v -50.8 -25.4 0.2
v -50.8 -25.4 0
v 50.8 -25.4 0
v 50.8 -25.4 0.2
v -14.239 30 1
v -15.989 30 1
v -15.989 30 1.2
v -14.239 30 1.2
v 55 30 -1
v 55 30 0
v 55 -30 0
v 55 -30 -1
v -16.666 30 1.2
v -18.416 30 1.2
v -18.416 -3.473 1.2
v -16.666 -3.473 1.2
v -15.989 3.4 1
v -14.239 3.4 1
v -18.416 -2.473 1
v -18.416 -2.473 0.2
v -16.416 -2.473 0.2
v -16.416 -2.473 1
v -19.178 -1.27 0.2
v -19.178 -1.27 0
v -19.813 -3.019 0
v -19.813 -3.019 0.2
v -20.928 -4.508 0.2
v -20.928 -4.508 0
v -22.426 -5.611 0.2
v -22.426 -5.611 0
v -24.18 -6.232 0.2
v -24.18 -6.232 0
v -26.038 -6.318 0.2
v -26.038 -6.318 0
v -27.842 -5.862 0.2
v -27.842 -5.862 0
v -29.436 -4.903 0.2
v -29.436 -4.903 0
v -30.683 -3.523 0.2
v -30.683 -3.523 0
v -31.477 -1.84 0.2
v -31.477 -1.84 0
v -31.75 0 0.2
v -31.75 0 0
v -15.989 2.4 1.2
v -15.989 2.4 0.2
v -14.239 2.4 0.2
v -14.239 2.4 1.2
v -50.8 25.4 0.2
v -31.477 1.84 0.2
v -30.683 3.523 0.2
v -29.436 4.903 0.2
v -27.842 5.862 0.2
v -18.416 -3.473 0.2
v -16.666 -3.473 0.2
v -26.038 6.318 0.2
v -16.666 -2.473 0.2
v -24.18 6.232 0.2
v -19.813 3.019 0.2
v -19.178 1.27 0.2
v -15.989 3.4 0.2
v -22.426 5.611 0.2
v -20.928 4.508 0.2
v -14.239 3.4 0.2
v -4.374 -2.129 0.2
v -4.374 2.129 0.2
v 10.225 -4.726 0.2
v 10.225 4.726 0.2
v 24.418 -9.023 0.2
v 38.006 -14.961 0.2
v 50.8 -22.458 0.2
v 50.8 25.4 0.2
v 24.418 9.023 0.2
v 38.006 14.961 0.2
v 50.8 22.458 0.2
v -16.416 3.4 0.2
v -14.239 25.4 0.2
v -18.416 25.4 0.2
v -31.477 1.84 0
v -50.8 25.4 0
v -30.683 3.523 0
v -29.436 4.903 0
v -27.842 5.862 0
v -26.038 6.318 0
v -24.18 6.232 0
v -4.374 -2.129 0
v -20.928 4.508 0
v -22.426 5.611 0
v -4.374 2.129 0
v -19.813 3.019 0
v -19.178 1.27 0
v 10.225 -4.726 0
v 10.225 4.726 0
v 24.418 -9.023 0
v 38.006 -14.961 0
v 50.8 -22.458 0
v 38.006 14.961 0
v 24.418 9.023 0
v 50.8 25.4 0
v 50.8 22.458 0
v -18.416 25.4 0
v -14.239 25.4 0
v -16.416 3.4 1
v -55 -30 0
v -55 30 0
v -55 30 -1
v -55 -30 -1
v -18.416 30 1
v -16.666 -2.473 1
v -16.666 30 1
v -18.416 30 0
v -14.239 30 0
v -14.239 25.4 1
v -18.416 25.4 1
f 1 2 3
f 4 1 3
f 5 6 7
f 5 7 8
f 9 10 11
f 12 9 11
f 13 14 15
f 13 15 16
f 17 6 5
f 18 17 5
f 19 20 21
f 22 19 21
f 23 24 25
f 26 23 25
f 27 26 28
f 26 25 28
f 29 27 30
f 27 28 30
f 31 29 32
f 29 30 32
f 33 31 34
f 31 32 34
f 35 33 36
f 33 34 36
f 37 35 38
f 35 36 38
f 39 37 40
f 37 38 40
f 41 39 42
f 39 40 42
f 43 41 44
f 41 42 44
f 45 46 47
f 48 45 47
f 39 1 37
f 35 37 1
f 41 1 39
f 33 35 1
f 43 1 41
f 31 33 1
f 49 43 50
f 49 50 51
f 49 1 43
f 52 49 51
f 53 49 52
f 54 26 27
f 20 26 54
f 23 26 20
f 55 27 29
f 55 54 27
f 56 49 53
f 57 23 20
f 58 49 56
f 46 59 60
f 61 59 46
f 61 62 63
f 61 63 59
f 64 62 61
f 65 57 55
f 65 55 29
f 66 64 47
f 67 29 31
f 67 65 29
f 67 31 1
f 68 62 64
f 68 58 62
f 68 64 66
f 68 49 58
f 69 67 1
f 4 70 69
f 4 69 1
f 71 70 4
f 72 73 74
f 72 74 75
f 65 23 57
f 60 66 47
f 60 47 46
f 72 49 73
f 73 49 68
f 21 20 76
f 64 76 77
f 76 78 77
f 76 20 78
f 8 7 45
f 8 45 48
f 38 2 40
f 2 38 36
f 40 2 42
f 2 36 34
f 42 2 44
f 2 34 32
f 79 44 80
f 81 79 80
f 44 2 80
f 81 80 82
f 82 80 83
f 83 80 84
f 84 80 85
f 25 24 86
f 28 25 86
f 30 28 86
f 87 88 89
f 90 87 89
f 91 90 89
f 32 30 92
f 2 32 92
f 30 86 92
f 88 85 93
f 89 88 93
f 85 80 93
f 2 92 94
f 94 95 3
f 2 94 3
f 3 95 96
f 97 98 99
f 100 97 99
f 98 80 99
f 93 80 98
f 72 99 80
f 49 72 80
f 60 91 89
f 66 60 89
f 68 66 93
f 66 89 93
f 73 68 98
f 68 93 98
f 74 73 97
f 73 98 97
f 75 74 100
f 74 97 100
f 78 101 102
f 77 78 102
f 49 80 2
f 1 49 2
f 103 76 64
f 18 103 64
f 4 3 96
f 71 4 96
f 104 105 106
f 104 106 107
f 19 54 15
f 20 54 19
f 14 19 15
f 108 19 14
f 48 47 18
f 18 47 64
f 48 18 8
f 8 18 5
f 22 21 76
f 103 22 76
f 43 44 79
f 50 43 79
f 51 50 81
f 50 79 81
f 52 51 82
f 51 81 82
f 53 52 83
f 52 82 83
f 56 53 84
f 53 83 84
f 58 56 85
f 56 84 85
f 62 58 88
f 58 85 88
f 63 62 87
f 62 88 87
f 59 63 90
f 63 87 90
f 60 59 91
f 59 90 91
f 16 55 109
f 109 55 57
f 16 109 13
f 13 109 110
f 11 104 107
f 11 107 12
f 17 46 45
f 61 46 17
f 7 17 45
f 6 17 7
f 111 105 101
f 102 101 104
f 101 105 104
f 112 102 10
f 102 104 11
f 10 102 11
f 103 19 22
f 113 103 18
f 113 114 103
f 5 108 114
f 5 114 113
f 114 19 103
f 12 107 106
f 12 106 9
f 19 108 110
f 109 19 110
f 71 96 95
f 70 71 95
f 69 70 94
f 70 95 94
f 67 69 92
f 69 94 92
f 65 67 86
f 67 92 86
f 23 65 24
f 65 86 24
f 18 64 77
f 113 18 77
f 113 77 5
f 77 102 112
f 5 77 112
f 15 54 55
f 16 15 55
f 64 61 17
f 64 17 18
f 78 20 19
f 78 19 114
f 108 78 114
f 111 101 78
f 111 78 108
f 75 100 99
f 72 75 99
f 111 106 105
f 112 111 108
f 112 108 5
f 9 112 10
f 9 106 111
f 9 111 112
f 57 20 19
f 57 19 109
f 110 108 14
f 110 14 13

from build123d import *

# Parameters (mm, degrees)
F1_DEPTH  = 0.2
F2_W      = 110
F2_H      = 60
F3_DEPTH  = 1
F5_DEPTH  = 0.8
F6_W      = 4.1765728965
F6_H      = 4.6
F7_DEPTH  = 1
F8_W      = 1.75
F8_H      = 32.4733061887
F9_DEPTH  = 0.2
F8_H_2    = 26.6
F10_W     = 1.75
F10_H     = 1
F11_DEPTH = 1


with BuildPart() as f1:
    # F0 (on Top) → F1 (new body)
    with BuildSketch(Plane.XY):
        with BuildLine():
            Line((-50.8, 25.4), (-50.8, 0))
            Line((-50.8, 0), (-31.75, 0))
            ThreePointArc((-31.75, 0), (-26.0382651501, 6.3178412134), (-19.1783094179, 1.2700654709))
            ThreePointArc((-19.1783094179, 1.2700654709), (17.3850333876, 6.6649625336), (50.8, 22.4580926135))
            Line((50.8, 22.4580926135), (50.8, 25.4))
            Line((50.8, 25.4), (-50.8, 25.4))
        make_face()
        with BuildLine():
            Line((-50.8, -25.4), (50.8, -25.4))
            Line((50.8, -25.4), (50.8, -22.4580926135))
            ThreePointArc((50.8, -22.4580926135), (17.3850333876, -6.6649625336), (-19.1783094179, -1.2700654709))
            ThreePointArc((-19.1783094179, -1.2700654709), (-26.0382651501, -6.3178412134), (-31.75, 0))
            Line((-31.75, 0), (-50.8, 0))
            Line((-50.8, 0), (-50.8, -25.4))
        make_face()
    extrude(amount=F1_DEPTH)



with BuildPart() as f3:
    # F2 (on face) → F3 (new body)
    with BuildSketch(Plane(origin=(0, 0, 0), x_dir=(1, 0, 0), z_dir=(0, 0, -1))):
        Rectangle(F2_W, F2_H)
        with BuildLine():
            Line((-50.8, -25.4), (-50.8, 25.4))
            Line((-50.8, 25.4), (50.8, 25.4))
            Line((50.8, 25.4), (50.8, 22.4580926135))
            ThreePointArc((50.8, 22.4580926135), (17.3850333876, 6.6649625336), (-19.1783094179, 1.2700654709))
            ThreePointArc((-19.1783094179, 1.2700654709), (-31.75, 0), (-19.1783094179, -1.2700654709))
            ThreePointArc((-19.1783094179, -1.2700654709), (17.3850333876, -6.6649625336), (50.8, -22.4580926135))
            Line((50.8, -22.4580926135), (50.8, -25.4))
            Line((50.8, -25.4), (-50.8, -25.4))
        make_face(mode=Mode.SUBTRACT)
        with BuildLine():
            Line((50.8, 25.4), (-50.8, 25.4))
            Line((-50.8, 25.4), (-50.8, -25.4))
            Line((-50.8, -25.4), (50.8, -25.4))
            Line((50.8, -25.4), (50.8, -22.4580926135))
            ThreePointArc((50.8, -22.4580926135), (17.3850333876, -6.6649625336), (-19.1783094179, -1.2700654709))
            ThreePointArc((-19.1783094179, -1.2700654709), (-31.75, 0), (-19.1783094179, 1.2700654709))
            ThreePointArc((-19.1783094179, 1.2700654709), (17.3850333876, 6.6649625336), (50.8, 22.4580926135))
            Line((50.8, 22.4580926135), (50.8, 25.4))
        make_face()
    extrude(amount=F3_DEPTH)



with BuildPart() as f5:
    # F4 (on face) → F5 (new body)
    with BuildSketch(Plane.XY.offset(0.2)):
        with BuildLine():
            ThreePointArc((-16.4155218303, -1.2976037429), (-17.4154701214, -1.2806251524), (-18.4155218303, -1.2716009111))
            Line((-18.4155218303, -1.2716009111), (-18.4155218303, -2.4733061887))
            Line((-18.4155218303, -2.4733061887), (-16.4155218303, -2.4733061887))
            Line((-16.4155218303, -2.4733061887), (-16.4155218303, -1.2976037429))
        make_face()
        with BuildLine():
            ThreePointArc((-16.4155218303, 1.2976037429), (-17.4154701214, 1.2806251524), (-18.4155218303, 1.2716009111))
            Line((-18.4155218303, 1.2716009111), (-18.4155218303, -1.2716009111))
            ThreePointArc((-18.4155218303, -1.2716009111), (-17.4154701214, -1.2806251524), (-16.4155218303, -1.2976037429))
            Line((-16.4155218303, -1.2976037429), (-16.4155218303, 1.2976037429))
        make_face()
        with BuildLine():
            Line((-16.4155218303, 3.4), (-18.4155218303, 3.4))
            Line((-18.4155218303, 3.4), (-18.4155218303, 1.2716009111))
            ThreePointArc((-18.4155218303, 1.2716009111), (-17.4154701214, 1.2806251524), (-16.4155218303, 1.2976037429))
            Line((-16.4155218303, 1.2976037429), (-16.4155218303, 3.4))
        make_face()
        Polygon((-18.4155218303, 25.4), (-18.4155218303, 3.4), (-16.4155218303, 3.4), (-14.2389489338, 3.4), (-14.2389489338, 25.4), align=None)
    extrude(amount=F5_DEPTH)


with BuildPart() as f3_1:
    add(f3.part)

    add(f5.part)  # F7 merges F5
    # F6 (on face) → F7 (join)
    with BuildSketch(Plane.XY):
        with Locations((-16.3272353821, 27.7)):
            Rectangle(F6_W, F6_H)
    extrude(amount=F7_DEPTH)


with BuildPart() as f9:
    # F8 (on face) → F9 (new body)
    with BuildSketch(Plane.XY.offset(1)):
        with Locations((-17.5405218303, 13.7633469056)):
            Rectangle(F8_W, F8_H)
    extrude(amount=F9_DEPTH)


with BuildPart() as f9b:
    # F8 (on face) → F9, piece 2 (new body)
    with BuildSketch(Plane.XY.offset(1)):
        with Locations((-15.1139489338, 16.7)):
            Rectangle(F8_W, F8_H_2)
    extrude(amount=F9_DEPTH)


with BuildPart() as f1_1:
    add(f1.part)

    add(f9.part)  # F11 merges F9

    add(f9b.part)  # F11 merges F9b
    # F10 (on face) → F11 (join)
    with BuildSketch(Plane.XY.offset(0.2)):
        with Locations((-17.5405218303, -2.9733061887)):
            Rectangle(F10_W, F10_H)
        with Locations((-15.1139489338, 2.9)):
            Rectangle(F10_W, F10_H)
    extrude(amount=F11_DEPTH)


solid = Compound([f3_1.part, f1_1.part])
